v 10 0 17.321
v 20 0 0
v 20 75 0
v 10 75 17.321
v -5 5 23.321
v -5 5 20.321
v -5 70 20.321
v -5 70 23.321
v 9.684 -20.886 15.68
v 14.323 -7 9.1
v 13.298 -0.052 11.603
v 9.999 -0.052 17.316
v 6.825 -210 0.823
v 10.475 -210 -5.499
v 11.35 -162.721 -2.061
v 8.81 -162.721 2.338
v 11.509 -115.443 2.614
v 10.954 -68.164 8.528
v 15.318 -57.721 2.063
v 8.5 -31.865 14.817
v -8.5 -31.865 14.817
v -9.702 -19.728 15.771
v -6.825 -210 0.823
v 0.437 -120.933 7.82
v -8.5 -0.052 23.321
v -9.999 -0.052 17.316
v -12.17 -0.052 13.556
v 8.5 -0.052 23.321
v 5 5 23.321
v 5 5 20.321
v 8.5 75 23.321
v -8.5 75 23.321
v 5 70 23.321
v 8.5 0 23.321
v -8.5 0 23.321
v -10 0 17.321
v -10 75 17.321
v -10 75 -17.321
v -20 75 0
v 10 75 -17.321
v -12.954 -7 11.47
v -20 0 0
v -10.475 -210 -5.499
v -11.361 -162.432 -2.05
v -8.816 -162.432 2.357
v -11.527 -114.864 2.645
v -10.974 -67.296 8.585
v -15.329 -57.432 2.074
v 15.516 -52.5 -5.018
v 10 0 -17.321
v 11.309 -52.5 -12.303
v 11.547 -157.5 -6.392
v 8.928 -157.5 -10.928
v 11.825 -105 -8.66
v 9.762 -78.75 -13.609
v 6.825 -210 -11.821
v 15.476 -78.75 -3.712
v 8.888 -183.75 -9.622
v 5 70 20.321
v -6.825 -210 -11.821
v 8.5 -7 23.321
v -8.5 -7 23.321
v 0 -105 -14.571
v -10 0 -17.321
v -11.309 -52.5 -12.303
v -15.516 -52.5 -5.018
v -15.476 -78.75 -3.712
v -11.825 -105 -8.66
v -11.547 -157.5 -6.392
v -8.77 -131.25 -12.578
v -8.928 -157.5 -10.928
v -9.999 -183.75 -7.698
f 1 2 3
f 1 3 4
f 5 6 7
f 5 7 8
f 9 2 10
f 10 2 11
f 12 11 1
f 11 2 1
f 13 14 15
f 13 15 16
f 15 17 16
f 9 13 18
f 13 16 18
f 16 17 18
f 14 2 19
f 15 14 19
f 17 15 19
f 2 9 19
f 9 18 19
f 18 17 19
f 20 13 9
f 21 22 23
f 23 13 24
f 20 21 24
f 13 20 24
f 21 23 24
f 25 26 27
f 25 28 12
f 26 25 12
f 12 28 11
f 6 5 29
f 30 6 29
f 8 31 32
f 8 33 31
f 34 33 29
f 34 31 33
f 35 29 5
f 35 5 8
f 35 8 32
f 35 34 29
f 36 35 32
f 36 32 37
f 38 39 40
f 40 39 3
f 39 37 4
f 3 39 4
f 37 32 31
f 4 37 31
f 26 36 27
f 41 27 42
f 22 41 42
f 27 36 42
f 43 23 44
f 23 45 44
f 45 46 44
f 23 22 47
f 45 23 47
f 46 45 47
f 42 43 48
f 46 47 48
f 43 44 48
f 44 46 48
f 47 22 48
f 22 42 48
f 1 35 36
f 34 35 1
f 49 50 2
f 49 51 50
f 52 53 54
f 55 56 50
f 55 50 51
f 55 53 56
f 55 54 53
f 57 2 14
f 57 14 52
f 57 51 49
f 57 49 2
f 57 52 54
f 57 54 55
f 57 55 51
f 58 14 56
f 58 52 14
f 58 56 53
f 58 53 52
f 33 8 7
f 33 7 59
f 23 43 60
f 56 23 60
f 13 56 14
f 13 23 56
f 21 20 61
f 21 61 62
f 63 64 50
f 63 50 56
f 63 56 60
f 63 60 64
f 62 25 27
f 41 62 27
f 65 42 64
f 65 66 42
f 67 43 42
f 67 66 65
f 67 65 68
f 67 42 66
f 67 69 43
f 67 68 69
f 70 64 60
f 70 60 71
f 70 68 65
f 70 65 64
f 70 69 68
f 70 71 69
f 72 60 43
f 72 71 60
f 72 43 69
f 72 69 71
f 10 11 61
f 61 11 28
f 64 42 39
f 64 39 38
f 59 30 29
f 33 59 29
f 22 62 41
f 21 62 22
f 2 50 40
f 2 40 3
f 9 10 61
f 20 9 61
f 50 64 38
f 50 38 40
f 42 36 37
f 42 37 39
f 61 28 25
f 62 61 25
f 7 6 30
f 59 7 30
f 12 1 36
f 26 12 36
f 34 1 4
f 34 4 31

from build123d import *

# Parameters (mm, degrees)
F1_DEPTH  = 75
F3_DEPTH  = 210
F3_TAPER  = 1.5
F7_DEPTH  = 75
F10_W     = 10
F10_H     = 3
F11_DEPTH = 65


# Not quite as in the source:
# - a feature names something its author has since deleted; it is built from what else it names


with BuildPart() as f1:
    # F0 (on Front) → F1 (new body)
    with BuildSketch(Plane.XZ):
        Polygon((-10, -17.3205080757), (10, -17.3205080757), (20, 0), (10, 17.3205080757), (-10, 17.3205080757), (-20, 0), align=None)
    extrude(amount=-F1_DEPTH)

    # F2 (on face) → F3 (join)
    with BuildSketch(Plane.XZ):
        Polygon((10, -17.3205080757), (20, 0), (-20, 0), (-10, -17.3205080757), align=None)
    extrude(amount=F3_DEPTH, taper=F3_TAPER)

    # F4 (on face) → F6 section 0
    with BuildSketch(Plane.XZ.offset(210)):
        Polygon((-10.4753772138, -5.4990435295), (10.4753772138, -5.4990435295), (6.8251257379, 0.8233774871), (-6.8251257379, 0.8233774871), align=None)
    # F5 (on face) → F6 section 1
    with BuildSketch(Plane.XZ):
        Polygon((-10, 17.3205080757), (-20, 0), (20, 0), (10, 17.3205080757), align=None)
    loft()

    # F0 (on Front) → F7 (join, through all)
    with BuildSketch(Plane.XZ):
        Polygon((-10, 17.3205080757), (10, 17.3205080757), (8.5, 23.3205080757), (-8.5, 23.3205080757), align=None)
    extrude(amount=-F7_DEPTH)

    # F10 (on offset) → F11 (cut)
    with BuildSketch(Plane.XZ.offset(-5)):
        with Locations((0, 21.8205080757)):
            Rectangle(F10_W, F10_H)
    extrude(amount=-F11_DEPTH, mode=Mode.SUBTRACT)

    # F14: sweep along a path in F13
    with BuildLine(Plane.YZ) as f14_path:
        Line((-7.1518244222, 23.3403816819), (-35.0594446063, 13.796761632))
    # F12 (on offset) → F14 (sweep)
    with BuildSketch(Plane.XZ.offset(7)):
        Polygon((-8.5, 23.3205080757), (-15.4033075124, 4.9551053697), (16.0198838661, 4.9551053697), (8.5, 23.3205080757), align=None)
    sweep(path=f14_path.line)

    # F16: sweep along a path in F15
    with BuildLine(Plane.YZ) as f16_path:
        Line((-6.9480864331, 23.3692936599), (0, 23.3692936599))
    # F12 (on offset) → F16 (sweep)
    with BuildSketch(Plane.XZ.offset(7)):
        Polygon((-8.5, 23.3205080757), (-15.4033075124, 4.9551053697), (16.0198838661, 4.9551053697), (8.5, 23.3205080757), align=None)
    sweep(path=f16_path.line)


solid = f1.part
